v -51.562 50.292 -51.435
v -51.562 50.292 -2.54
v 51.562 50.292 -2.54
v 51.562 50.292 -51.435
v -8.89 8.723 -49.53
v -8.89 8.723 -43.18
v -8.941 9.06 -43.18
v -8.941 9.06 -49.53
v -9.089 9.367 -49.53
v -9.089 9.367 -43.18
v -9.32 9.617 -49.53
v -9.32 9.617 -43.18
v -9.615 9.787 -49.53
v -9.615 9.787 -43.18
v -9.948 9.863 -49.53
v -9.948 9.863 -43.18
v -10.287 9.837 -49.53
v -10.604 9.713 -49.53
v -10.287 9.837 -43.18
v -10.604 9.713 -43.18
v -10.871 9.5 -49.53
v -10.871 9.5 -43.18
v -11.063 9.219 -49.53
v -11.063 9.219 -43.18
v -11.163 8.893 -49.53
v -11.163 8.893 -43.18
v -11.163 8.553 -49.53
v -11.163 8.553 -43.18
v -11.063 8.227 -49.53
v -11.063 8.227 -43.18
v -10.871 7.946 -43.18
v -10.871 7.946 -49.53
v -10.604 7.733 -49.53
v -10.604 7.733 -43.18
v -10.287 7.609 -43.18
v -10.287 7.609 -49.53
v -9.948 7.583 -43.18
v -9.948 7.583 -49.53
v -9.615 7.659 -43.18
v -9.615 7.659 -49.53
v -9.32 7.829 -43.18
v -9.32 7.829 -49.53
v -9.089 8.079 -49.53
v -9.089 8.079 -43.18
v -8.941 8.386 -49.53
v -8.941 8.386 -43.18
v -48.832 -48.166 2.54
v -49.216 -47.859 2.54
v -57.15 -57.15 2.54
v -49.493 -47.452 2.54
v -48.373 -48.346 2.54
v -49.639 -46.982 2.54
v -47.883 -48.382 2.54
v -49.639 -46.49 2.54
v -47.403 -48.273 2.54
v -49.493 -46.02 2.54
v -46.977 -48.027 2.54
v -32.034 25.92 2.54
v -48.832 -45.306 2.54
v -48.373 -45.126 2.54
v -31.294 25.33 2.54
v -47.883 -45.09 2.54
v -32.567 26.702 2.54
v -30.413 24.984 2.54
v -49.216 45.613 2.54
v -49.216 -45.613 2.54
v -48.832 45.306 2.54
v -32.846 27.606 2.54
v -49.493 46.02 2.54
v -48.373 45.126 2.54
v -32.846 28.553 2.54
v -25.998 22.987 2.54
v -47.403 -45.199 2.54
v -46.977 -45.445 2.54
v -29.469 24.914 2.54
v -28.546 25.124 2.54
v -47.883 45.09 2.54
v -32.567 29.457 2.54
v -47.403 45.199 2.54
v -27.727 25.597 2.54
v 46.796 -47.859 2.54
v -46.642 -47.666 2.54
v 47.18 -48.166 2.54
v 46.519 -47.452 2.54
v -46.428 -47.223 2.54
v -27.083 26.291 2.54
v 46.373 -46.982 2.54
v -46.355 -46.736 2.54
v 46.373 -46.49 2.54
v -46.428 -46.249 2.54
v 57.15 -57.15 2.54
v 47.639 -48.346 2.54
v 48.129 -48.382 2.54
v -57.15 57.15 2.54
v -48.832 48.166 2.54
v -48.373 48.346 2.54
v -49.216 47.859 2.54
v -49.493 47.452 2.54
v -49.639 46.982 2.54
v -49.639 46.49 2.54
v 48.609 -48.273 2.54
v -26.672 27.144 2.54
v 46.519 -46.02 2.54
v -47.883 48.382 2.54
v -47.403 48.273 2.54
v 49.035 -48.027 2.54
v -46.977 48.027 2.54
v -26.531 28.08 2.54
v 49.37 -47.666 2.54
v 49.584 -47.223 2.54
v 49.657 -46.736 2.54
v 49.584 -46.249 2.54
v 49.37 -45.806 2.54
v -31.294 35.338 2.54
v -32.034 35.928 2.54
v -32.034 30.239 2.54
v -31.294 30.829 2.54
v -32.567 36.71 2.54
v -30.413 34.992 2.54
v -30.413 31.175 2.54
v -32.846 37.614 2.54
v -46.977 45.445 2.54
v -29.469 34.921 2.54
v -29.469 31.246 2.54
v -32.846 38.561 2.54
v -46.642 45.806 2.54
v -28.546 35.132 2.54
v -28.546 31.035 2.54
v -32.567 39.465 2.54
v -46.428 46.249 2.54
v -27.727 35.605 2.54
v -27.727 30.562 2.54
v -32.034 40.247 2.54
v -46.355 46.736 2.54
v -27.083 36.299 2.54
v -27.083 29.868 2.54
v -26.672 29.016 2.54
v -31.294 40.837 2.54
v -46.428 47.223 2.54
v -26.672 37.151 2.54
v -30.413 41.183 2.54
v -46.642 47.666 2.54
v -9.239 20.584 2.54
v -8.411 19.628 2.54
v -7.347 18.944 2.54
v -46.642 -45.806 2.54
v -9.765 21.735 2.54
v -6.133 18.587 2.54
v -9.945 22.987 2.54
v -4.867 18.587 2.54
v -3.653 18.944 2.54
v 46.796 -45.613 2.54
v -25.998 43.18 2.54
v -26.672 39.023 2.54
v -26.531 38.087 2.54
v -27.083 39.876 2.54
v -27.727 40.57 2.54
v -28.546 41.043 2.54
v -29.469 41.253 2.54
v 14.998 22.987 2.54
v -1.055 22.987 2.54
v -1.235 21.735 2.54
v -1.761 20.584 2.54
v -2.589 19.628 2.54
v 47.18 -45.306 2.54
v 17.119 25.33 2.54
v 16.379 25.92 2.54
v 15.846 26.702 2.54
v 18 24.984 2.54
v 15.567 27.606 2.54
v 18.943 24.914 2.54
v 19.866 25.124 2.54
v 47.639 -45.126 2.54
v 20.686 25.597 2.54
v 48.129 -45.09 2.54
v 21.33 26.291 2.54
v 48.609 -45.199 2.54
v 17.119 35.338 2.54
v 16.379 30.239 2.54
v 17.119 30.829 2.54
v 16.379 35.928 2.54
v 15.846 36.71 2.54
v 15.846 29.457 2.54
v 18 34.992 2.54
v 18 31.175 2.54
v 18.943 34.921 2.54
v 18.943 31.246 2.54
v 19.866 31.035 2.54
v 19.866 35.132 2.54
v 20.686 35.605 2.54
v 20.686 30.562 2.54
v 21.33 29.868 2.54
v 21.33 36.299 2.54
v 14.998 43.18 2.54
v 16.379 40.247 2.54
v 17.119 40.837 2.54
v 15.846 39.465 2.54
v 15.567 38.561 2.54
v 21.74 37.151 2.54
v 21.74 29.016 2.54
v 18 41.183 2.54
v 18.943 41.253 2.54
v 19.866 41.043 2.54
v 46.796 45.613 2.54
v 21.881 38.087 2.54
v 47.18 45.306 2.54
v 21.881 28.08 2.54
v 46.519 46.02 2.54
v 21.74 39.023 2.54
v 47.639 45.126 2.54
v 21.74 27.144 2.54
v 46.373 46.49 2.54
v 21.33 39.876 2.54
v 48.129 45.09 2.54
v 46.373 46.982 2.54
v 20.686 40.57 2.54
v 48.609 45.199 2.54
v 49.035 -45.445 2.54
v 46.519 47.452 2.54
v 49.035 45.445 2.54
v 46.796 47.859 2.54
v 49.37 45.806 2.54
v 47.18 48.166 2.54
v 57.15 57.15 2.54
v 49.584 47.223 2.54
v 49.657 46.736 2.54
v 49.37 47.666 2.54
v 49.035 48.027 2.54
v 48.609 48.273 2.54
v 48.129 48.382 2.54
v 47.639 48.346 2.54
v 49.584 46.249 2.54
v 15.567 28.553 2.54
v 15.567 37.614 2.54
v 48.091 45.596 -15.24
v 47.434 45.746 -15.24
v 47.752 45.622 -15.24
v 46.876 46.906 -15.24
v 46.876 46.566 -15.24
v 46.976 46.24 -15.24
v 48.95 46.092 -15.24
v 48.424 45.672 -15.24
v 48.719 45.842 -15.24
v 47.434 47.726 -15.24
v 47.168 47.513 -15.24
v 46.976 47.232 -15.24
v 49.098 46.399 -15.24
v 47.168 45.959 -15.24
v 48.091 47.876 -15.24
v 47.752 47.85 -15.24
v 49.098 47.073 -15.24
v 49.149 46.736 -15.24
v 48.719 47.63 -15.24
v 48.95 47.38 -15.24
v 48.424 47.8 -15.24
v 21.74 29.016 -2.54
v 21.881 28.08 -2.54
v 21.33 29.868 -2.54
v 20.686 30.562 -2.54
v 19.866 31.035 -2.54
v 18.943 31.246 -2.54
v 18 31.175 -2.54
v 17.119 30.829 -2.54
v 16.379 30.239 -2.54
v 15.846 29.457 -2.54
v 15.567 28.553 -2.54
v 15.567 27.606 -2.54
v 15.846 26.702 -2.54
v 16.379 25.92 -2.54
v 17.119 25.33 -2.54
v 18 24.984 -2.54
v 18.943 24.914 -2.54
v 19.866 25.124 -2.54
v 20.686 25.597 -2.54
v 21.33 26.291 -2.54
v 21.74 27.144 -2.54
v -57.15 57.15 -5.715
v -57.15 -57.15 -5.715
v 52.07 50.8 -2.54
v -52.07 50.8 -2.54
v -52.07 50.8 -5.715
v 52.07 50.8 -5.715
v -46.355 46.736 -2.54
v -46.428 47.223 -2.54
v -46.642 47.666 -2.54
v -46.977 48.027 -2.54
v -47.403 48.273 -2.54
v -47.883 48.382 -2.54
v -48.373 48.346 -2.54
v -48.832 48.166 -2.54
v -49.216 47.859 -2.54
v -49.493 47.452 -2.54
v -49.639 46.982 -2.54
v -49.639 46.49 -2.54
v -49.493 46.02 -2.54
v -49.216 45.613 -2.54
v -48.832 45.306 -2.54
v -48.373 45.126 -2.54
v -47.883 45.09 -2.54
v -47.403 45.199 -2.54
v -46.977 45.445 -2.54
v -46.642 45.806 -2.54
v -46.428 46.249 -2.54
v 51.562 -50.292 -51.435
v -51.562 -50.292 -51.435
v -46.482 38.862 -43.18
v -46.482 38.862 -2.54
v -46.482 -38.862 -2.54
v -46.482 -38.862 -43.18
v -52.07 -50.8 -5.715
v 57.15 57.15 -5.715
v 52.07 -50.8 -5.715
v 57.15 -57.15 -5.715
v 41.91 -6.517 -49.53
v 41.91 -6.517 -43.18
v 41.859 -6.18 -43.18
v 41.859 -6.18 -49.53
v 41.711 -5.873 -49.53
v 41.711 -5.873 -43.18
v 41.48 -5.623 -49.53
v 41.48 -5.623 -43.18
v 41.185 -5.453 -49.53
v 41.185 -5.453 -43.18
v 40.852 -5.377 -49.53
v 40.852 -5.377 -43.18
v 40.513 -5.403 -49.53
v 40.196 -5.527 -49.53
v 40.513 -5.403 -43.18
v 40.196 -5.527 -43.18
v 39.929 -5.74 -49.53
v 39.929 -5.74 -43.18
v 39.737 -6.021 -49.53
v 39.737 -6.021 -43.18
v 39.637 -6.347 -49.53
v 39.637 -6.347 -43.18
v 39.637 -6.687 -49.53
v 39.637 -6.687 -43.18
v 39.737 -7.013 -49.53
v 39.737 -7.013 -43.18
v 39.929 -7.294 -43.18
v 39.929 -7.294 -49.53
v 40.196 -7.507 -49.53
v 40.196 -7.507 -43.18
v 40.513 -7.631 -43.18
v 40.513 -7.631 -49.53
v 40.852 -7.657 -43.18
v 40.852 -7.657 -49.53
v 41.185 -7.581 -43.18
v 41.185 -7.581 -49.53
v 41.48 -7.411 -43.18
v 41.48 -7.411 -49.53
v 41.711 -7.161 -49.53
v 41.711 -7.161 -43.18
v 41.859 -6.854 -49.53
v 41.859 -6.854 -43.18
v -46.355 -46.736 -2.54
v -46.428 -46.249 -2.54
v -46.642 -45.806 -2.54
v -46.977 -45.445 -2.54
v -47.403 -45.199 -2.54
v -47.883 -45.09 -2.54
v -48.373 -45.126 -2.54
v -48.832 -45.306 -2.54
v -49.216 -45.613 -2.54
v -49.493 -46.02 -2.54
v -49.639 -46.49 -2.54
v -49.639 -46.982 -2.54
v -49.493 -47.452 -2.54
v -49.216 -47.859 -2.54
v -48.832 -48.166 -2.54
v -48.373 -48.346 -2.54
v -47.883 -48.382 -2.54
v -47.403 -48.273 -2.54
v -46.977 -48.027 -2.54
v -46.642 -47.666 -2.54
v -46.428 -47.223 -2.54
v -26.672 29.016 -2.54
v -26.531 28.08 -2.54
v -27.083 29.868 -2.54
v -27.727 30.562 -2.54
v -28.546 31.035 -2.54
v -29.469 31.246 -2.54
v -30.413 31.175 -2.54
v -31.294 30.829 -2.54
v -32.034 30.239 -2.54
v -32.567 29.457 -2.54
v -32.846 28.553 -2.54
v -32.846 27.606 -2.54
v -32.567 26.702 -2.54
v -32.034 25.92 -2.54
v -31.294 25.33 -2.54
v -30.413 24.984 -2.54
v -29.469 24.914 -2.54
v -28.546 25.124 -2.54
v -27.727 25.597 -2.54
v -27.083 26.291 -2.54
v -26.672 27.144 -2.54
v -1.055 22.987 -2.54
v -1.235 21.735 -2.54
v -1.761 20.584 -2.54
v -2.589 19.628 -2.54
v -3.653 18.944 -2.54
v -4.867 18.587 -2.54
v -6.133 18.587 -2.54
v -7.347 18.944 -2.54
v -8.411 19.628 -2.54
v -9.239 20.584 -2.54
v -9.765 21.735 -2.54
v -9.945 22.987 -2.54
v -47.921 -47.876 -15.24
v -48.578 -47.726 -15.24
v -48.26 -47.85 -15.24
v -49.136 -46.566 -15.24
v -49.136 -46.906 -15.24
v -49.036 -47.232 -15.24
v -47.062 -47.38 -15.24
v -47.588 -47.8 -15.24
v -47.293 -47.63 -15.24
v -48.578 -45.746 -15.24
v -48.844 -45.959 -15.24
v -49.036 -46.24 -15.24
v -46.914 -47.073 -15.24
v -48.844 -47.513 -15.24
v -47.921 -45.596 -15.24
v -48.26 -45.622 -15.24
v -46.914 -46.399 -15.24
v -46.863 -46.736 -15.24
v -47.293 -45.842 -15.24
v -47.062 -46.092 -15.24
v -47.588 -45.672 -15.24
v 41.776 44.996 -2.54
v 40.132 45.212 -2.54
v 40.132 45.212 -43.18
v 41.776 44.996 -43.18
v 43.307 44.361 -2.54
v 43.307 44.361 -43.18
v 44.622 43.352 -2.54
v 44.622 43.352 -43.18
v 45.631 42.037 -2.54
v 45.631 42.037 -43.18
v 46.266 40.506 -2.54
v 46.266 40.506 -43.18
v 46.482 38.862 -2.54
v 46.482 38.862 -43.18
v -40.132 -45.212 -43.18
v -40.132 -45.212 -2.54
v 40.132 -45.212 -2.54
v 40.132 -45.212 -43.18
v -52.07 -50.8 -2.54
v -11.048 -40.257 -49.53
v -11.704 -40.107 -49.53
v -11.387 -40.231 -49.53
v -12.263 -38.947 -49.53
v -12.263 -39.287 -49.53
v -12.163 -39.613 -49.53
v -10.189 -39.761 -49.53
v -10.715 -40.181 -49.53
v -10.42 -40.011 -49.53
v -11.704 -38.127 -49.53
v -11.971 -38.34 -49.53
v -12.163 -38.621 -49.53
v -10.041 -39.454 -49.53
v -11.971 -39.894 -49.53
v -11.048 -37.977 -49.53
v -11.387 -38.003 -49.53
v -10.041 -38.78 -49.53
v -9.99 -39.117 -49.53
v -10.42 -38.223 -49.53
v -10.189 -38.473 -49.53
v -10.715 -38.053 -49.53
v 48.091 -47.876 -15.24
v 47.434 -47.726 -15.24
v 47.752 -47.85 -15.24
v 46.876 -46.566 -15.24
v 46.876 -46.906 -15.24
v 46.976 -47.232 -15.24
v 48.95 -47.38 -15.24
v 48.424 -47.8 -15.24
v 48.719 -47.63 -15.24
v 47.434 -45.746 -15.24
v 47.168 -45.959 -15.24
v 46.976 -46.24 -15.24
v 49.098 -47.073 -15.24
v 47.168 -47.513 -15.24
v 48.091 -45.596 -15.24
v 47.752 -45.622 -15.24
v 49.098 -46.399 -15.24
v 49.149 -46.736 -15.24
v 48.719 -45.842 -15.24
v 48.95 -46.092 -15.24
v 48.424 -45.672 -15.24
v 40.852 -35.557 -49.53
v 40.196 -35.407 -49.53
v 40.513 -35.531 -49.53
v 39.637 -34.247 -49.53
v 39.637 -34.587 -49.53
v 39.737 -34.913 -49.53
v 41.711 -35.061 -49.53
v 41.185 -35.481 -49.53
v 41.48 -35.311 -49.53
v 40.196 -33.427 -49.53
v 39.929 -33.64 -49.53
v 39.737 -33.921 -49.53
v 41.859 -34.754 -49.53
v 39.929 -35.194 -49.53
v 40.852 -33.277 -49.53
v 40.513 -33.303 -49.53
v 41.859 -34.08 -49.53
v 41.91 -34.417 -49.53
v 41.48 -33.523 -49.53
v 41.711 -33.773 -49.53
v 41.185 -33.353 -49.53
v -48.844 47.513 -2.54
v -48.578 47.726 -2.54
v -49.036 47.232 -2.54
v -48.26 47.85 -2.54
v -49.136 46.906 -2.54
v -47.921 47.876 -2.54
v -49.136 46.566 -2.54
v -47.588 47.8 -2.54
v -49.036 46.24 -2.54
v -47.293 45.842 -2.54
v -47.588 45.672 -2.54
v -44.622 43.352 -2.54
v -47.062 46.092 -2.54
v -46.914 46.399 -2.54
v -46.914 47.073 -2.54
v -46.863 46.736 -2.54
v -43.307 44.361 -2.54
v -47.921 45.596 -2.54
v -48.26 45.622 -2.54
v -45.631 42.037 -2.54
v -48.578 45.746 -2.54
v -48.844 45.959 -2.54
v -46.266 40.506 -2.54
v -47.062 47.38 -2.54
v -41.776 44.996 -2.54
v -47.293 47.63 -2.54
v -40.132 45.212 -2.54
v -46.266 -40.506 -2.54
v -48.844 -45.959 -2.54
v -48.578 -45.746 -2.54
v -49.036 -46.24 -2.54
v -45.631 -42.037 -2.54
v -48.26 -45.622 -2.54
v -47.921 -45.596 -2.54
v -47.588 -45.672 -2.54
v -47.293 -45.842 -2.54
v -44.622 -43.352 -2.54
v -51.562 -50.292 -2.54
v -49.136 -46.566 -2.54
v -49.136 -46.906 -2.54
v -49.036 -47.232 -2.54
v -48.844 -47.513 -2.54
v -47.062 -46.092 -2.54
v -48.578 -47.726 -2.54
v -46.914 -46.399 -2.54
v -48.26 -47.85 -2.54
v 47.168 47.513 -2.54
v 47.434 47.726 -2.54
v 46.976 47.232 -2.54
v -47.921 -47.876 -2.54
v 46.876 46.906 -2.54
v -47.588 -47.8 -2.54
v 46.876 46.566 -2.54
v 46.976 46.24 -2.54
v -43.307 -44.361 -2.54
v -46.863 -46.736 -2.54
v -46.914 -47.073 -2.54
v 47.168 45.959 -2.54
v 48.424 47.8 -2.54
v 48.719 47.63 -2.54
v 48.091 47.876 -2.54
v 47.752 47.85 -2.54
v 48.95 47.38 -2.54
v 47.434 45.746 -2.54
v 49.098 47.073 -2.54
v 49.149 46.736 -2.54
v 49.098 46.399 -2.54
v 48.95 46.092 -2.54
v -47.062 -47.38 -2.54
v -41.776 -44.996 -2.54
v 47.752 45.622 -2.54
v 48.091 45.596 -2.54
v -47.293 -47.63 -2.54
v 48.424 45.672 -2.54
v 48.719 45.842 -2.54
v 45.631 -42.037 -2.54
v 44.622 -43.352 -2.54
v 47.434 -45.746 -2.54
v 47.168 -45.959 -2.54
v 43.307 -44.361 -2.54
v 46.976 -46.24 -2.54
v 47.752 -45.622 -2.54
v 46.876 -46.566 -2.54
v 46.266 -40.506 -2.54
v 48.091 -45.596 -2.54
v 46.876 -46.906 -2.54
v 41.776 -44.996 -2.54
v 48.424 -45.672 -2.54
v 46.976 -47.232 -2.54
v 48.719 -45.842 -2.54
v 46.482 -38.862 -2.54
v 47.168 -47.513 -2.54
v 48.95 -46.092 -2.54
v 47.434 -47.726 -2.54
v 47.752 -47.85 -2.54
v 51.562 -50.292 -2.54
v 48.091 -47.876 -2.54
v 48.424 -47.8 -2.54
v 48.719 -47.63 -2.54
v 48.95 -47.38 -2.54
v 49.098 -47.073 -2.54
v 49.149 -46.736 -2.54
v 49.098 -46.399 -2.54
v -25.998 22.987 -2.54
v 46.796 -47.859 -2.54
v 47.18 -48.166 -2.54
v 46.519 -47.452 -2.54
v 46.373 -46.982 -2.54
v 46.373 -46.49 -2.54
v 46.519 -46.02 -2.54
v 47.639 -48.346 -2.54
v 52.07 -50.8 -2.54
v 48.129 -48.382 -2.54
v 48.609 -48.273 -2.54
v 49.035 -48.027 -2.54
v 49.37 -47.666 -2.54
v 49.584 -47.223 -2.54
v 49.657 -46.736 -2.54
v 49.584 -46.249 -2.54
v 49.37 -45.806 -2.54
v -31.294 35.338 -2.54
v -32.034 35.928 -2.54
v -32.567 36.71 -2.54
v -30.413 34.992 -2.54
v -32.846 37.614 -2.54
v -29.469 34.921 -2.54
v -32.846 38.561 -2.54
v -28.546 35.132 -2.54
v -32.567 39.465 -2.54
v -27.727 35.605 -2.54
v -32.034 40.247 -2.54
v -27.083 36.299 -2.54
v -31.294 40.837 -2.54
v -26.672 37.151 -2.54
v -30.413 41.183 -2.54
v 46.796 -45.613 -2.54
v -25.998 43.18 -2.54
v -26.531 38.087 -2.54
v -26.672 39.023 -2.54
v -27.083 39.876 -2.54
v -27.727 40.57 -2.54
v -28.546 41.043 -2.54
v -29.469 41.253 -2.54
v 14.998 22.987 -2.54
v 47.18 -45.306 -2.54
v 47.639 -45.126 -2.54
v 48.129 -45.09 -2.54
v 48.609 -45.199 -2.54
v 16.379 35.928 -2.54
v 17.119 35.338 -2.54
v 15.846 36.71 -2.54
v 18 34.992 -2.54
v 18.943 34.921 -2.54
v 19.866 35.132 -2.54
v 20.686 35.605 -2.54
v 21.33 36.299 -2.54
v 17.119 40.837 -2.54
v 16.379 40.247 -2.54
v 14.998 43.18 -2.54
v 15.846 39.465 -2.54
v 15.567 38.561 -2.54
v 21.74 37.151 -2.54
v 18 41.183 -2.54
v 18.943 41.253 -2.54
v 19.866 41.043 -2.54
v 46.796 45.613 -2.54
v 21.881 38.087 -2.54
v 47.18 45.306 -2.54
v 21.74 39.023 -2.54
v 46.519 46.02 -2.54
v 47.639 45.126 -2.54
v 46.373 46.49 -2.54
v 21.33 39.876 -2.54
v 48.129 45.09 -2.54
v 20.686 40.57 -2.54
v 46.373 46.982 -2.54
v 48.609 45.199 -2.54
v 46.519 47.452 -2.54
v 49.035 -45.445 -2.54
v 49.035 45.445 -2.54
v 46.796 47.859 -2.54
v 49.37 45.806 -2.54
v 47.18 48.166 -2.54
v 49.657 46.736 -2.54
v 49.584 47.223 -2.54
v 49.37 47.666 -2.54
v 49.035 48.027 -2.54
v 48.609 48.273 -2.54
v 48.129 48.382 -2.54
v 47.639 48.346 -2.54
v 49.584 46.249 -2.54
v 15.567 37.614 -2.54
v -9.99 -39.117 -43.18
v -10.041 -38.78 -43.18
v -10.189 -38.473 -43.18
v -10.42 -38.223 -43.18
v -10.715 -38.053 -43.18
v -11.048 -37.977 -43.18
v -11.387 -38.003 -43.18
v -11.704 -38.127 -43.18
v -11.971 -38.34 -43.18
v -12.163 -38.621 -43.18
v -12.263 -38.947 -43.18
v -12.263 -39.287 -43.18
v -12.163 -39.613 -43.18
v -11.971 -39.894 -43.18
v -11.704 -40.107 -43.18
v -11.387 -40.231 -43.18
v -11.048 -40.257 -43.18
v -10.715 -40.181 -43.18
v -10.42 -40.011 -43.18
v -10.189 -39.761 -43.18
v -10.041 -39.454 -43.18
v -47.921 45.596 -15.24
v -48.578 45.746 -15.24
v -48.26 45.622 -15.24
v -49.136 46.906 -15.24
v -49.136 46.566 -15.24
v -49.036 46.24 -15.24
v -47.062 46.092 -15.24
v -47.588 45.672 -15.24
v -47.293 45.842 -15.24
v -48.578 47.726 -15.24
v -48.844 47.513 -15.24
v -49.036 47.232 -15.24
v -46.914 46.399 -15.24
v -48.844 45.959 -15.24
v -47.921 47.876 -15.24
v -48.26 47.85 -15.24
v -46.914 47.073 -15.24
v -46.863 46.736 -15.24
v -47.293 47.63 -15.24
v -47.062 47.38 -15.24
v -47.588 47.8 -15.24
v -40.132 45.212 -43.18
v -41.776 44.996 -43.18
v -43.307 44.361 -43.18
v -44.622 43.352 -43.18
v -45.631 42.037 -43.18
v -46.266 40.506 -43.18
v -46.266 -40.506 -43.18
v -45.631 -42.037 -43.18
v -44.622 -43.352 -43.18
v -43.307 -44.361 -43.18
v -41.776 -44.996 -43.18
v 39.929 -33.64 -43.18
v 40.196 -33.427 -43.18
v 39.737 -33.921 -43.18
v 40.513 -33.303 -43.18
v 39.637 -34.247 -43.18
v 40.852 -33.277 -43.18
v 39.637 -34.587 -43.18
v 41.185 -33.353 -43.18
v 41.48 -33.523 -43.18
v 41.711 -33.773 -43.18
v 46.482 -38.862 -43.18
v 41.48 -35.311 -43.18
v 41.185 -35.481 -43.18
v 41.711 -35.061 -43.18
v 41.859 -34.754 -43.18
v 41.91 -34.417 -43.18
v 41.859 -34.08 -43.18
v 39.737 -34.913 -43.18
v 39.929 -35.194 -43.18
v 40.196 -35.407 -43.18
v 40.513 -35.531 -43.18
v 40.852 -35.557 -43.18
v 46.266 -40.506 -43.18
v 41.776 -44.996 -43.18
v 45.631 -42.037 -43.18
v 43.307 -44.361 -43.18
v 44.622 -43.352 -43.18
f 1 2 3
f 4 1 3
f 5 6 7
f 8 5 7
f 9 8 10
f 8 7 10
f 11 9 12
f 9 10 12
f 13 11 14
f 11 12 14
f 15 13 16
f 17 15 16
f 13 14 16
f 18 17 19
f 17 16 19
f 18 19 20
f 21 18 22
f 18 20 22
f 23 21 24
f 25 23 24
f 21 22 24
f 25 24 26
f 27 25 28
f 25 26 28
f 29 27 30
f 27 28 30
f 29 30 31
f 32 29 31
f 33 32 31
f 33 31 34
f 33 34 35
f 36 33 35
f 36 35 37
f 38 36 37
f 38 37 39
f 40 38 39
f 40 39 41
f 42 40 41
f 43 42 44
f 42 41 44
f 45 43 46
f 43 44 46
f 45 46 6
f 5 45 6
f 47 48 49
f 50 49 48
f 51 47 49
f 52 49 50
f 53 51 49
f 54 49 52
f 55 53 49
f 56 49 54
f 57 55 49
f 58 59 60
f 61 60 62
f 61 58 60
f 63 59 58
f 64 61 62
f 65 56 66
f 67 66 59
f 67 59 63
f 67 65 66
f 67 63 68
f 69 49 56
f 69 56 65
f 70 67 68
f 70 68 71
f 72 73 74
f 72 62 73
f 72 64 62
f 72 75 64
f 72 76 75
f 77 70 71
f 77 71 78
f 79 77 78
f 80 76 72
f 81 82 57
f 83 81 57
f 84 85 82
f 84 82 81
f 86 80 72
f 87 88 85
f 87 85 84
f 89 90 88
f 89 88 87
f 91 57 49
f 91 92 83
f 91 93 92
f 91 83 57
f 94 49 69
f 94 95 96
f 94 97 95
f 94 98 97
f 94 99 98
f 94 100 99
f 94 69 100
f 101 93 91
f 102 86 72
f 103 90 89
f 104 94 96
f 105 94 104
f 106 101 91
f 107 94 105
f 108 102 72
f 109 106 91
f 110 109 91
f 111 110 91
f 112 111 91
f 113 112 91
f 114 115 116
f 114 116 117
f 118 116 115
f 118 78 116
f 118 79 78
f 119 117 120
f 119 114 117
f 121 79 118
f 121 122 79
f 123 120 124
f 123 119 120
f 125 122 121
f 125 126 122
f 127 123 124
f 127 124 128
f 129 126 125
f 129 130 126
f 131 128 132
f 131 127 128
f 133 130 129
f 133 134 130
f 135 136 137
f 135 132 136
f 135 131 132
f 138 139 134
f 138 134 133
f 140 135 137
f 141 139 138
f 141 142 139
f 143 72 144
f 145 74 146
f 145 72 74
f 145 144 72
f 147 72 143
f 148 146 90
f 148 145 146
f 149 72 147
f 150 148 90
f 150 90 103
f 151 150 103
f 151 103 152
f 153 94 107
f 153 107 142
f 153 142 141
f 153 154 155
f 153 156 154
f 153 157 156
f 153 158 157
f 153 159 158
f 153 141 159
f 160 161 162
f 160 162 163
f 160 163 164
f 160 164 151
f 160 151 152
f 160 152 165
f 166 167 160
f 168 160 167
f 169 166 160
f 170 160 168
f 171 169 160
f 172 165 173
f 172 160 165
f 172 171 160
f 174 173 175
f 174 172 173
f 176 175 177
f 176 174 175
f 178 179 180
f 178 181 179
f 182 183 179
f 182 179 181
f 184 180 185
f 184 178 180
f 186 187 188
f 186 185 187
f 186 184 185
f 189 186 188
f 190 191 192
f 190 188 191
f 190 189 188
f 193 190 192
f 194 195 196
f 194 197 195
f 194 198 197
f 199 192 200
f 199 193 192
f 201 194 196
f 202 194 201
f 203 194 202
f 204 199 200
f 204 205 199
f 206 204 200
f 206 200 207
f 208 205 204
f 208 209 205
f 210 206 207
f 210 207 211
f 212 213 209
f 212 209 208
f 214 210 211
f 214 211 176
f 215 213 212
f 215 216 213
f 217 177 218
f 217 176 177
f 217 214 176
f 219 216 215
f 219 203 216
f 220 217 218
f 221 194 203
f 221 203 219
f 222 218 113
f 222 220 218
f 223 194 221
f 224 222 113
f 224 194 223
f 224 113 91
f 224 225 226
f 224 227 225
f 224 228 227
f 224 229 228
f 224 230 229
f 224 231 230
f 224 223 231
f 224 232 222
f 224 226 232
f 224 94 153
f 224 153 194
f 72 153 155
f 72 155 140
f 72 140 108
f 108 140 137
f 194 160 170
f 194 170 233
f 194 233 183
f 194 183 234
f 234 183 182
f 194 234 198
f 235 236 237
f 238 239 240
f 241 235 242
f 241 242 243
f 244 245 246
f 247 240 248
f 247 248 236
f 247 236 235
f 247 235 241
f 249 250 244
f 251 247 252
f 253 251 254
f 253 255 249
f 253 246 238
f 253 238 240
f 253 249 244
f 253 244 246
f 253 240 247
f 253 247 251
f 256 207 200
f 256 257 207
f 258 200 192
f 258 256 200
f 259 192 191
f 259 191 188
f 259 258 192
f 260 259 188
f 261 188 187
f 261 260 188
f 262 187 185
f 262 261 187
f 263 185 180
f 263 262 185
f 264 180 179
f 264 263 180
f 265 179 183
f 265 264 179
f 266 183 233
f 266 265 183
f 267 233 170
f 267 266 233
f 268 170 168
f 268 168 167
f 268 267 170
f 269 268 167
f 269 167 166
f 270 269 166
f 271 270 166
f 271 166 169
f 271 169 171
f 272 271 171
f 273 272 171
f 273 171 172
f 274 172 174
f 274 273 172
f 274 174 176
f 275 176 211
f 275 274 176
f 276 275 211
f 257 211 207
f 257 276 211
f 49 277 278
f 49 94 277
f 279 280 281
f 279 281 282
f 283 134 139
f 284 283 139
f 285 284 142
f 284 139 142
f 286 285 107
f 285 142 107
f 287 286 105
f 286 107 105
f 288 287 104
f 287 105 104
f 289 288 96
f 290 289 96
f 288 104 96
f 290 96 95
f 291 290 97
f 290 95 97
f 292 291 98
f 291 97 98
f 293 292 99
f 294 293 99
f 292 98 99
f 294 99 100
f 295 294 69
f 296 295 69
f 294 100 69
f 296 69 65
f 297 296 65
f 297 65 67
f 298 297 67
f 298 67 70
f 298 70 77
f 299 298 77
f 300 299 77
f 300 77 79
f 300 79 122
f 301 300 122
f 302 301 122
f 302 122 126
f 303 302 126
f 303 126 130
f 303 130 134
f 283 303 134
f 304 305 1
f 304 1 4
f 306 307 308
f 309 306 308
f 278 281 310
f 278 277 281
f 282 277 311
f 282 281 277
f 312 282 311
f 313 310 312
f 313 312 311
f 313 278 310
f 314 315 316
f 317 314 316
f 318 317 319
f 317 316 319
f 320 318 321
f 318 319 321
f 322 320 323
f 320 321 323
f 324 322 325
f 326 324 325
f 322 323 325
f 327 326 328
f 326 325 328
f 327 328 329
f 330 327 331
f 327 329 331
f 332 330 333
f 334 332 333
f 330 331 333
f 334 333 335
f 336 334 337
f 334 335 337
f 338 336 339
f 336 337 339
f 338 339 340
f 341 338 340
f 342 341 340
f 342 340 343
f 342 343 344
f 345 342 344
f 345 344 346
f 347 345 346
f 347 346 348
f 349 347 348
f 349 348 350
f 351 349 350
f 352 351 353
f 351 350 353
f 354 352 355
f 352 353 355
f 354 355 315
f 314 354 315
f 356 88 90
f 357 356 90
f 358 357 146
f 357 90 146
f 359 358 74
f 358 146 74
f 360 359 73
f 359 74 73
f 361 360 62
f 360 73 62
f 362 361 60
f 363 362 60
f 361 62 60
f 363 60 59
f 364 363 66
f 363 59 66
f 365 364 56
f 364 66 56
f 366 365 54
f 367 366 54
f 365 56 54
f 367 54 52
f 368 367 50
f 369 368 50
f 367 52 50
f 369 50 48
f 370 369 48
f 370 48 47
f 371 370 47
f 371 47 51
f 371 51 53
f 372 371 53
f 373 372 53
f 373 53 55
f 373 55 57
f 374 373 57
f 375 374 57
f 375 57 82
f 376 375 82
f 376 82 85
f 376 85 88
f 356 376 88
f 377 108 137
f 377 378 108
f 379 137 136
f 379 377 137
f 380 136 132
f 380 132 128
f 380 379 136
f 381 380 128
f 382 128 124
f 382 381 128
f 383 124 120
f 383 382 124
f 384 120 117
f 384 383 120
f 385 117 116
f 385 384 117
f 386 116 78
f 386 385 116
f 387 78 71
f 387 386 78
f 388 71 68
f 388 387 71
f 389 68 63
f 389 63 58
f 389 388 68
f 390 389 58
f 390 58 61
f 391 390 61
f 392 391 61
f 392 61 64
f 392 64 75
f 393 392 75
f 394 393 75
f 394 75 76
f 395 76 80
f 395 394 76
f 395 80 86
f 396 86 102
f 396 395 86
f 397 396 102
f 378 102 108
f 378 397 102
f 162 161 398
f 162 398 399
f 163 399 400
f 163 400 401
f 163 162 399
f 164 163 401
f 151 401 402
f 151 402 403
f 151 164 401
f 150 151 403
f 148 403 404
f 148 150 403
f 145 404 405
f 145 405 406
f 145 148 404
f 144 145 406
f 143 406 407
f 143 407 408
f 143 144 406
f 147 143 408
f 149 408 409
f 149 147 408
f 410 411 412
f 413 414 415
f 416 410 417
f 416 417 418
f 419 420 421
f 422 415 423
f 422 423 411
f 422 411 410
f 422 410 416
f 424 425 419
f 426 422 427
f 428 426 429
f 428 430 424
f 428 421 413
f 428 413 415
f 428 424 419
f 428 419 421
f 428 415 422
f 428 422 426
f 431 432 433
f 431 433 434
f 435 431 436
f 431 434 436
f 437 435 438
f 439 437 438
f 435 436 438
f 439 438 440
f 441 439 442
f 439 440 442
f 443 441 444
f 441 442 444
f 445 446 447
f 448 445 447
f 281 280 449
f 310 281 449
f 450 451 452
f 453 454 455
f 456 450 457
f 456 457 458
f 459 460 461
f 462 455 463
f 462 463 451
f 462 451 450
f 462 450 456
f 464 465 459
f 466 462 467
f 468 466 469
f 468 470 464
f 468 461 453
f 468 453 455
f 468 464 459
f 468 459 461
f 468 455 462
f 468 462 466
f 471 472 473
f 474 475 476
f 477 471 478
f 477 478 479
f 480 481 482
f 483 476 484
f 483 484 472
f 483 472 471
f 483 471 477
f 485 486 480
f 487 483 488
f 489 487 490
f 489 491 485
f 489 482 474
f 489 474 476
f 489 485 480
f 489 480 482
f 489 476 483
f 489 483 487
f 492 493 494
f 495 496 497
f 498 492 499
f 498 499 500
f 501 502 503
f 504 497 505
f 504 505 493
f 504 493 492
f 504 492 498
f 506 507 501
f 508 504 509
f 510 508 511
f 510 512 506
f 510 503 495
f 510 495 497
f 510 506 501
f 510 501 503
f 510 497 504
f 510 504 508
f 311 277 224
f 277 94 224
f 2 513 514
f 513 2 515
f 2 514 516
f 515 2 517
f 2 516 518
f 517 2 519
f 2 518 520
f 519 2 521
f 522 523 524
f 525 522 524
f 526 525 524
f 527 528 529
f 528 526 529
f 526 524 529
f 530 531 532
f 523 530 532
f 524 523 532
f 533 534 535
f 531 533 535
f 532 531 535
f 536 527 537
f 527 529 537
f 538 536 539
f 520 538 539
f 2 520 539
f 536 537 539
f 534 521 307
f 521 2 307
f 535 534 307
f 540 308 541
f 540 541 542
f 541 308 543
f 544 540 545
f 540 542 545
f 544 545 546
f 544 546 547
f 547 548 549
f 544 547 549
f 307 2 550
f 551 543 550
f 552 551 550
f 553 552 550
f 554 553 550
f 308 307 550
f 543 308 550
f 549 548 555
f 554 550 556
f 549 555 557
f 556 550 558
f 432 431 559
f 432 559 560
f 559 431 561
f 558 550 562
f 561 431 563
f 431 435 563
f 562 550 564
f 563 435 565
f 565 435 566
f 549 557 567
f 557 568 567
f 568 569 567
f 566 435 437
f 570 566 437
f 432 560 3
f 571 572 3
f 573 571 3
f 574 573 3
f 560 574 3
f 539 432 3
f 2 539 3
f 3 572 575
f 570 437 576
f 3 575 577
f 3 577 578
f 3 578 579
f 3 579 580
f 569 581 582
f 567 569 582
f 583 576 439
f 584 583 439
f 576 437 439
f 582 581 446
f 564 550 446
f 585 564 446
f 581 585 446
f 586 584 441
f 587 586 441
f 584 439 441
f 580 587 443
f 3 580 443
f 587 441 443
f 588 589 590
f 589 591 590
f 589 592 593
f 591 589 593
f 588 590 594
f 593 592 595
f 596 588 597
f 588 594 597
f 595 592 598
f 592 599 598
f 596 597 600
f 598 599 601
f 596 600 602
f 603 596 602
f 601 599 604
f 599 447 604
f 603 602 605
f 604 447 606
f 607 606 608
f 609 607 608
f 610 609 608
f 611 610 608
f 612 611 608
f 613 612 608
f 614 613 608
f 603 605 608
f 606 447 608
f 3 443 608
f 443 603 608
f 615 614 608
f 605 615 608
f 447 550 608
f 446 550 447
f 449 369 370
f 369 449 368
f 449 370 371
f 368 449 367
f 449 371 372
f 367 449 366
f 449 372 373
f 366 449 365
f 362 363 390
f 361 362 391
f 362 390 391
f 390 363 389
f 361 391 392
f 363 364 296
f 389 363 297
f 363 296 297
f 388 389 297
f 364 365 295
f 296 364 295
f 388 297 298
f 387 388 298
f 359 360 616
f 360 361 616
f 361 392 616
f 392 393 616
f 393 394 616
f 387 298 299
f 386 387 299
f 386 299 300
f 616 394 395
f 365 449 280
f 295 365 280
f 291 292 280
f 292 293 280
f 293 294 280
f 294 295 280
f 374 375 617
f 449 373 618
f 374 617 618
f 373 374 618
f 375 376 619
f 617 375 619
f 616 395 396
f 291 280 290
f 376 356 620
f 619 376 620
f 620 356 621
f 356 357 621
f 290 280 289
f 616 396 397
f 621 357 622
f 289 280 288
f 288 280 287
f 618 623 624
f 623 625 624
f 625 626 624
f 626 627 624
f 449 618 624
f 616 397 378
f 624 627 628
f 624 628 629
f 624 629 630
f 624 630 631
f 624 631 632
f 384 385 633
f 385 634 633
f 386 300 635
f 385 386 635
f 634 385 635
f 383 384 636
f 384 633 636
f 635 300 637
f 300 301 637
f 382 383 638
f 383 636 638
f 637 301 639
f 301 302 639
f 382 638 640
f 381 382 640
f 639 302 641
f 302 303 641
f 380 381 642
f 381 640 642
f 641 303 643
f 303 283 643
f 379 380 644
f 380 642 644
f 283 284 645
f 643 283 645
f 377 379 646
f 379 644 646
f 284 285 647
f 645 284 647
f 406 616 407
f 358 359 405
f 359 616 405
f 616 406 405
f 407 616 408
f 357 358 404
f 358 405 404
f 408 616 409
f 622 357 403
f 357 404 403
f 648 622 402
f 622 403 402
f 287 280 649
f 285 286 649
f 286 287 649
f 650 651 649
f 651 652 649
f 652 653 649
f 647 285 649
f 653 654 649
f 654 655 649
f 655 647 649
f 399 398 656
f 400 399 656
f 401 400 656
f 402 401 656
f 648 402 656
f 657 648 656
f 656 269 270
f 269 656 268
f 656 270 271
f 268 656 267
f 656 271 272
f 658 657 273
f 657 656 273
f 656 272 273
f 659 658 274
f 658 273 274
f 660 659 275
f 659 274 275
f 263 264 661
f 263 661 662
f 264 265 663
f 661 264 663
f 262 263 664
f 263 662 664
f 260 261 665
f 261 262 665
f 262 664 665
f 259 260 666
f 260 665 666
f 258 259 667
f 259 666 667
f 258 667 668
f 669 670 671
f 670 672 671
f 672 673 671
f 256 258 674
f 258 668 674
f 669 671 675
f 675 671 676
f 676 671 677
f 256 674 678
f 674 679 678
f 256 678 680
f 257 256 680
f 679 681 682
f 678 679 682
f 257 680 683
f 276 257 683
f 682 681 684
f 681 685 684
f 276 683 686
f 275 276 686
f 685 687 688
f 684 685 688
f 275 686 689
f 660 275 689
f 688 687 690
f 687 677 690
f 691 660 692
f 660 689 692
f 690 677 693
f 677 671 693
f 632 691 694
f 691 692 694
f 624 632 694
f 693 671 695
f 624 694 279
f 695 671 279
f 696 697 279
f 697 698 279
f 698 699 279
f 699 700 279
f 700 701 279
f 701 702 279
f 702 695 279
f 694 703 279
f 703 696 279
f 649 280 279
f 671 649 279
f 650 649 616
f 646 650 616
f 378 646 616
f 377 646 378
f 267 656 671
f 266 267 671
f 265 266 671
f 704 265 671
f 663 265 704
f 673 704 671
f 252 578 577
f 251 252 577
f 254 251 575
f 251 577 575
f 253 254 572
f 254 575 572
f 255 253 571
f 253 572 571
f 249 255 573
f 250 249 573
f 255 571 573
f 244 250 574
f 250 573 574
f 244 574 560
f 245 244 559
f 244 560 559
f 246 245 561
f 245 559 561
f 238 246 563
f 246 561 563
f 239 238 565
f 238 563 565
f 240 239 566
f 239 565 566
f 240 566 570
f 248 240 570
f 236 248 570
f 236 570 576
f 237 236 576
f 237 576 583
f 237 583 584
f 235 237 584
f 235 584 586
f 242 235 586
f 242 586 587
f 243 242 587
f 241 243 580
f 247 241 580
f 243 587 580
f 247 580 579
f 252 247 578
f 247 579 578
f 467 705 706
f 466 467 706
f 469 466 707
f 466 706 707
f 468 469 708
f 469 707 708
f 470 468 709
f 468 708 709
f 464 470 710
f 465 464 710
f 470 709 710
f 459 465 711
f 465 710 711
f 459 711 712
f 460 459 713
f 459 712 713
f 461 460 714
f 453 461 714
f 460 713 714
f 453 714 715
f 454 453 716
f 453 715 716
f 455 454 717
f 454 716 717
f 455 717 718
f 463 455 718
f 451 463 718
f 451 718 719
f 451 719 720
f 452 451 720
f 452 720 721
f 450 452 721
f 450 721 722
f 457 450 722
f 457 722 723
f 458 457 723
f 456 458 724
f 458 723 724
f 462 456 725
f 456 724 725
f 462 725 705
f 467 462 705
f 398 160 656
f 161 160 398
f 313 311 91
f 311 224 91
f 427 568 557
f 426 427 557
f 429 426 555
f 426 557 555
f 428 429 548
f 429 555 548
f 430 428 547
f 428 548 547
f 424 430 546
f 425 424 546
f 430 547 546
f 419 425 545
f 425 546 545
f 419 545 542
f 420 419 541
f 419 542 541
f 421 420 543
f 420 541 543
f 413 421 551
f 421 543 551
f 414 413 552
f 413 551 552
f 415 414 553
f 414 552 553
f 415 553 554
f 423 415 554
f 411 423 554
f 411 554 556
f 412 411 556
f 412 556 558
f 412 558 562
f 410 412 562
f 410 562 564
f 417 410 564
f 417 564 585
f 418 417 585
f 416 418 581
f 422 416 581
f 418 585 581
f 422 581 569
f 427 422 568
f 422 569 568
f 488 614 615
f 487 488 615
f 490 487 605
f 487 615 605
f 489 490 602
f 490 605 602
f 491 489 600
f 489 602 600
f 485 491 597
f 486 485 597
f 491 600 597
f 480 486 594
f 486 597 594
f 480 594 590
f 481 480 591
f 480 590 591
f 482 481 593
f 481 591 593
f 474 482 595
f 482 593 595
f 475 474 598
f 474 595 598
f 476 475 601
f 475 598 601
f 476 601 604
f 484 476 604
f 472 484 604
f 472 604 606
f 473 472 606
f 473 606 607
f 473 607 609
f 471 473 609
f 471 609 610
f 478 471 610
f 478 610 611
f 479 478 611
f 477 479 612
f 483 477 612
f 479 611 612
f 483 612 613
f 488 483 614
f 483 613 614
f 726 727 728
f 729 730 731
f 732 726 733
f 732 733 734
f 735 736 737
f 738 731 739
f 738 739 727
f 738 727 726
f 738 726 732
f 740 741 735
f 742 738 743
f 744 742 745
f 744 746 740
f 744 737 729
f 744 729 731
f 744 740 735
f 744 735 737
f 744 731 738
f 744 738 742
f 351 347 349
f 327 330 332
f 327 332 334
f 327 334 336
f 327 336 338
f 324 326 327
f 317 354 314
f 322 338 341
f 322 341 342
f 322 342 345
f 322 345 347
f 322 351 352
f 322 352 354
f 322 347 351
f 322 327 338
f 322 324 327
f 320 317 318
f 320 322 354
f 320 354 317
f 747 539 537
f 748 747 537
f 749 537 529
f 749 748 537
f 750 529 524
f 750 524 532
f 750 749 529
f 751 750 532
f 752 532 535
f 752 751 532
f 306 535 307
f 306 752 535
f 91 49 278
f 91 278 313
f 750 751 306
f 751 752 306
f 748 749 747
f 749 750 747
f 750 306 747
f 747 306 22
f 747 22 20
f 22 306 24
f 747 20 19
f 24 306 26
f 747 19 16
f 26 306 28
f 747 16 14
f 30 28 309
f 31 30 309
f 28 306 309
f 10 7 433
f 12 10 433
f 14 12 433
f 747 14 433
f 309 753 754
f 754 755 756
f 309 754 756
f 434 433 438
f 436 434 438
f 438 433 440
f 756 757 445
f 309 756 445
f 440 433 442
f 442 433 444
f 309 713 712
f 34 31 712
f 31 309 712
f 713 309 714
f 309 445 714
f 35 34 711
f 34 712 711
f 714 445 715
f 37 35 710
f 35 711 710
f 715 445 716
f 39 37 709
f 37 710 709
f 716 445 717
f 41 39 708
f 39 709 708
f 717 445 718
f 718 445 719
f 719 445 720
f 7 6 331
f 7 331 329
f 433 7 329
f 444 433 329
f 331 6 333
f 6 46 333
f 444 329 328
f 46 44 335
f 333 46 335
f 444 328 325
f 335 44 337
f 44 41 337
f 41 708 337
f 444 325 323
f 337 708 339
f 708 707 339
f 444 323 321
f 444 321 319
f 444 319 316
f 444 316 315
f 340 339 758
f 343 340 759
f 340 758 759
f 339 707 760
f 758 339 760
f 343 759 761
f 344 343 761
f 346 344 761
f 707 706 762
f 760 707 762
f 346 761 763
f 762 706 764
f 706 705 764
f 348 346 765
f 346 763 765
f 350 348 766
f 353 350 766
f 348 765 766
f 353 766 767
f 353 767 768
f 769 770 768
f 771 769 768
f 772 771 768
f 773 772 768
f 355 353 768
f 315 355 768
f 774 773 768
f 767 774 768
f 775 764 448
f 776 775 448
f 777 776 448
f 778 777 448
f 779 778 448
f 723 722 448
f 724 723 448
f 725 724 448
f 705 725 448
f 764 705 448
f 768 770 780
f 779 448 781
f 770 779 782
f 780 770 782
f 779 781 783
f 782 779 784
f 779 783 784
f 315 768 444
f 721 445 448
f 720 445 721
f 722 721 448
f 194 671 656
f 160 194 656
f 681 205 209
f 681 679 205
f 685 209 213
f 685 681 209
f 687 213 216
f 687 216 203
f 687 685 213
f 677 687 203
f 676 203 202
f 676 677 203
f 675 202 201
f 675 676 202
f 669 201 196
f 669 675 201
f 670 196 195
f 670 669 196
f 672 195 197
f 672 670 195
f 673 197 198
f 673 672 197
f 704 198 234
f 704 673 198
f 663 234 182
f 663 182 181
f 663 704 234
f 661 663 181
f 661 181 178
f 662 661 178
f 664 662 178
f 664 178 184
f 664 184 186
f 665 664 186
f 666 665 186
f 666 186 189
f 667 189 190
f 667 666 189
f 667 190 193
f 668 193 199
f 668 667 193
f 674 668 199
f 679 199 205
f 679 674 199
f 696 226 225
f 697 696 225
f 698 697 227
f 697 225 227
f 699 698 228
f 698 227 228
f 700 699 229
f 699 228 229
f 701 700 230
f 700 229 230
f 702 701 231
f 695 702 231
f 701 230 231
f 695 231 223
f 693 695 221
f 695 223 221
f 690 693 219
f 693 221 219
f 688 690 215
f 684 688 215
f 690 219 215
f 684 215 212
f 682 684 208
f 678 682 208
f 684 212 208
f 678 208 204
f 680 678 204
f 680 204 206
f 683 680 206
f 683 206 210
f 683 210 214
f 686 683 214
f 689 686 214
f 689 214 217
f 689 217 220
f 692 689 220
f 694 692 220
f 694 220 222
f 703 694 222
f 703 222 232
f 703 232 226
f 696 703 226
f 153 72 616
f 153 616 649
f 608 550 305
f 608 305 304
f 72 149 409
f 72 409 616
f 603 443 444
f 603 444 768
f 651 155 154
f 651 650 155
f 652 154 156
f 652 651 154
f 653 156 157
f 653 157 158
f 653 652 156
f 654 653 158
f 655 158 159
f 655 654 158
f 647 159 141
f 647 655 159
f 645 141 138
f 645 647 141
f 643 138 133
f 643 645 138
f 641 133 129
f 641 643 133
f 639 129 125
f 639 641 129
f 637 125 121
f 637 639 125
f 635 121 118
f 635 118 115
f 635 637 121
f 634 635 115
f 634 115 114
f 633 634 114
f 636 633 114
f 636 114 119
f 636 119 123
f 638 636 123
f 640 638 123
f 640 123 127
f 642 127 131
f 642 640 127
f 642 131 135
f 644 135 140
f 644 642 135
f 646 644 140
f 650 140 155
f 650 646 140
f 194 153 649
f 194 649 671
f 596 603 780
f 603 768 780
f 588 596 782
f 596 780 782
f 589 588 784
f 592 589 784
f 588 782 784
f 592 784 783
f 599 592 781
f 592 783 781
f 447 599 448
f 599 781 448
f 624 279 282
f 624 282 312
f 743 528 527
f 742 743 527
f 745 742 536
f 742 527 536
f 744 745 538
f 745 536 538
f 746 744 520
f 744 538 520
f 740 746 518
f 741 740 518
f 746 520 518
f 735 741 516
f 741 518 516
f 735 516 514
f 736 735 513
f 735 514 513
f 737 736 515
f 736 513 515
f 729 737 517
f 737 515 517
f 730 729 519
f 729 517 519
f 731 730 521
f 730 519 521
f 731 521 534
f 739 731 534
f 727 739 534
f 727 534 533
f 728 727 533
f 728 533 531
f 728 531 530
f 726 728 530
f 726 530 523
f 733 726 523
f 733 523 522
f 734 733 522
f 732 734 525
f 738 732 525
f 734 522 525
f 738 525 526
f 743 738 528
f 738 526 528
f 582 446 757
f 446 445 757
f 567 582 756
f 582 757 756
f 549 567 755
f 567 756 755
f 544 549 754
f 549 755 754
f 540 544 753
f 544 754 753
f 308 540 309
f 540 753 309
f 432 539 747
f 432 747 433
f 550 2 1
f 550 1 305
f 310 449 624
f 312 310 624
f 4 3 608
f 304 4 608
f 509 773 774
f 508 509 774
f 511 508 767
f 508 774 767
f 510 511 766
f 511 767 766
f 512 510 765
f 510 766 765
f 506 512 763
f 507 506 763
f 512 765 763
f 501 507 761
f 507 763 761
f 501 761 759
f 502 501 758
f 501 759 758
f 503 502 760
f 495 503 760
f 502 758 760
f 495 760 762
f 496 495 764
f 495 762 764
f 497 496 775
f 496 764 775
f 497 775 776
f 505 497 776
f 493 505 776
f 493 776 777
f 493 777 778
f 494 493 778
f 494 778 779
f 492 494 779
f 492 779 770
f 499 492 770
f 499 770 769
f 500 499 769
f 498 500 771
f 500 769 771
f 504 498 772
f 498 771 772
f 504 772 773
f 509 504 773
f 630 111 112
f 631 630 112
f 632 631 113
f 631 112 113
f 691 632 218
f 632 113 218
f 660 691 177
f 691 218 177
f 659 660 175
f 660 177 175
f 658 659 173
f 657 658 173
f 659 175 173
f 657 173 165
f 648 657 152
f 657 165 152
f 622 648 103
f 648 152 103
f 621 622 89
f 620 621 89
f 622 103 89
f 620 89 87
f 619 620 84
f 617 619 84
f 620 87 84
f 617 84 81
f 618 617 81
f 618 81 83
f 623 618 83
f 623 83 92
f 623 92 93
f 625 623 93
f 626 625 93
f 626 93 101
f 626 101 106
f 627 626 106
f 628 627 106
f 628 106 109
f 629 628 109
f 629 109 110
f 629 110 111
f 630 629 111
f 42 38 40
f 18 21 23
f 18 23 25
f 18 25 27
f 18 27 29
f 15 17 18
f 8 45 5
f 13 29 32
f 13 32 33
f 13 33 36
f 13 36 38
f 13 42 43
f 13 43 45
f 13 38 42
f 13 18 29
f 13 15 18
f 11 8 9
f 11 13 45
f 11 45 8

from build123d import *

# Parameters (mm, degrees)
F0_R      = 3.175
F1_DEPTH  = 2.54
F2_W      = 114.3
F2_H      = 114.3
F2_W_2    = 104.14
F2_H_2    = 101.6
F3_DEPTH  = 3.175
F4_W      = 103.124
F4_H      = 100.584
F4_W_2    = 92.964
F4_H_2    = 90.424
F5_DEPTH  = 48.895
F6_W      = 103.124
F6_H      = 100.584
F7_DEPTH  = 8.255
F8_R      = 1.143
F9_DEPTH  = 6.35
F10_R     = 6.35
F11_R     = 1.143
F12_DEPTH = 12.7
F13_R     = 1.651
F14_DEPTH = 53.976


with BuildPart() as f1:
    # F0 (on Top) → F1 (new body, symmetric)
    with BuildSketch(Plane.XY):
        Polygon((57.15, -57.15), (57.15, 57.15), (0, 57.15), (-5.5, 57.15), (-57.15, 57.15), (-57.15, -57.15), align=None)
        with Locations((-29.7062, 28.0797)):
            Circle(F0_R, mode=Mode.SUBTRACT)
        with Locations((-29.7062, 38.0873)):
            Circle(F0_R, mode=Mode.SUBTRACT)
        with BuildLine():
            Line((-25.9978, 22.987), (-25.9978, 43.18))
            Line((-25.9978, 43.18), (14.9978, 43.18))
            Line((14.9978, 43.18), (14.9978, 22.987))
            Line((14.9978, 22.987), (-1.055, 22.987))
            ThreePointArc((-1.055, 22.987), (-5.5, 18.542), (-9.945, 22.987))
            Line((-9.945, 22.987), (-25.9978, 22.987))
        make_face(mode=Mode.SUBTRACT)
        with Locations((18.7062, 28.0797)):
            Circle(F0_R, mode=Mode.SUBTRACT)
        with Locations((18.7062, 38.0873)):
            Circle(F0_R, mode=Mode.SUBTRACT)
    extrude(amount=F1_DEPTH, both=True)

    # F2 (on face) → F3 (join)
    with BuildSketch(Plane(origin=(0, 0, -2.54), x_dir=(1, 0, 0), z_dir=(0, 0, -1))):
        Rectangle(F2_W, F2_H)
        Rectangle(F2_W_2, F2_H_2, mode=Mode.SUBTRACT)
    extrude(amount=F3_DEPTH)

    # F13 (on face) → F14 (cut, through all)
    with BuildSketch(Plane.XY.offset(2.54)):
        with Locations((-48.006, -46.736)):
            Circle(F13_R)
        with Locations((-48.006, 46.736)):
            Circle(F13_R)
        with Locations((48.006, 46.736)):
            Circle(F13_R)
        with Locations((48.006, -46.736)):
            Circle(F13_R)
    extrude(amount=-F14_DEPTH, mode=Mode.SUBTRACT)


with BuildPart() as f5:
    # F4 (on face) → F5 (new body)
    with BuildSketch(Plane(origin=(0, 0, -2.54), x_dir=(1, 0, 0), z_dir=(0, 0, -1))):
        Rectangle(F4_W, F4_H)
        Rectangle(F4_W_2, F4_H_2, mode=Mode.SUBTRACT)
    extrude(amount=F5_DEPTH)

    # F6 (on face) → F7 (join)
    with BuildSketch(Plane(origin=(0, 0, -51.435), x_dir=(1, 0, 0), z_dir=(0, 0, -1))):
        Rectangle(F6_W, F6_H)
    extrude(amount=-F7_DEPTH)

    # F8 (on face) → F9 (cut)
    with BuildSketch(Plane.XY.offset(-43.18)):
        with Locations((-10.033, 8.723)):
            Circle(F8_R)
        with Locations((40.767, -6.517)):
            Circle(F8_R)
        with Locations((40.767, -34.417)):
            Circle(F8_R)
        with Locations((-11.133, -39.117)):
            Circle(F8_R)
    extrude(amount=-F9_DEPTH, mode=Mode.SUBTRACT)

    # F10
    f10_edges = [f5.edges().sort_by_distance(p)[0] for p in [
        (-46.482, 45.212, -22.86),
        (46.482, 45.212, -22.86),
        (46.482, -45.212, -22.86),
        (-46.482, -45.212, -22.86),
    ]]
    fillet(f10_edges, radius=F10_R)

    # F11 (on face) → F12 (cut)
    with BuildSketch(Plane.XY.offset(-2.54)):
        with Locations((-48.006, 46.736)):
            Circle(F11_R)
        with Locations((48.006, 46.736)):
            Circle(F11_R)
        with Locations((48.006, -46.736)):
            Circle(F11_R)
        with Locations((-48.006, -46.736)):
            Circle(F11_R)
    extrude(amount=-F12_DEPTH, mode=Mode.SUBTRACT)


solid = Compound([f1.part, f5.part])
